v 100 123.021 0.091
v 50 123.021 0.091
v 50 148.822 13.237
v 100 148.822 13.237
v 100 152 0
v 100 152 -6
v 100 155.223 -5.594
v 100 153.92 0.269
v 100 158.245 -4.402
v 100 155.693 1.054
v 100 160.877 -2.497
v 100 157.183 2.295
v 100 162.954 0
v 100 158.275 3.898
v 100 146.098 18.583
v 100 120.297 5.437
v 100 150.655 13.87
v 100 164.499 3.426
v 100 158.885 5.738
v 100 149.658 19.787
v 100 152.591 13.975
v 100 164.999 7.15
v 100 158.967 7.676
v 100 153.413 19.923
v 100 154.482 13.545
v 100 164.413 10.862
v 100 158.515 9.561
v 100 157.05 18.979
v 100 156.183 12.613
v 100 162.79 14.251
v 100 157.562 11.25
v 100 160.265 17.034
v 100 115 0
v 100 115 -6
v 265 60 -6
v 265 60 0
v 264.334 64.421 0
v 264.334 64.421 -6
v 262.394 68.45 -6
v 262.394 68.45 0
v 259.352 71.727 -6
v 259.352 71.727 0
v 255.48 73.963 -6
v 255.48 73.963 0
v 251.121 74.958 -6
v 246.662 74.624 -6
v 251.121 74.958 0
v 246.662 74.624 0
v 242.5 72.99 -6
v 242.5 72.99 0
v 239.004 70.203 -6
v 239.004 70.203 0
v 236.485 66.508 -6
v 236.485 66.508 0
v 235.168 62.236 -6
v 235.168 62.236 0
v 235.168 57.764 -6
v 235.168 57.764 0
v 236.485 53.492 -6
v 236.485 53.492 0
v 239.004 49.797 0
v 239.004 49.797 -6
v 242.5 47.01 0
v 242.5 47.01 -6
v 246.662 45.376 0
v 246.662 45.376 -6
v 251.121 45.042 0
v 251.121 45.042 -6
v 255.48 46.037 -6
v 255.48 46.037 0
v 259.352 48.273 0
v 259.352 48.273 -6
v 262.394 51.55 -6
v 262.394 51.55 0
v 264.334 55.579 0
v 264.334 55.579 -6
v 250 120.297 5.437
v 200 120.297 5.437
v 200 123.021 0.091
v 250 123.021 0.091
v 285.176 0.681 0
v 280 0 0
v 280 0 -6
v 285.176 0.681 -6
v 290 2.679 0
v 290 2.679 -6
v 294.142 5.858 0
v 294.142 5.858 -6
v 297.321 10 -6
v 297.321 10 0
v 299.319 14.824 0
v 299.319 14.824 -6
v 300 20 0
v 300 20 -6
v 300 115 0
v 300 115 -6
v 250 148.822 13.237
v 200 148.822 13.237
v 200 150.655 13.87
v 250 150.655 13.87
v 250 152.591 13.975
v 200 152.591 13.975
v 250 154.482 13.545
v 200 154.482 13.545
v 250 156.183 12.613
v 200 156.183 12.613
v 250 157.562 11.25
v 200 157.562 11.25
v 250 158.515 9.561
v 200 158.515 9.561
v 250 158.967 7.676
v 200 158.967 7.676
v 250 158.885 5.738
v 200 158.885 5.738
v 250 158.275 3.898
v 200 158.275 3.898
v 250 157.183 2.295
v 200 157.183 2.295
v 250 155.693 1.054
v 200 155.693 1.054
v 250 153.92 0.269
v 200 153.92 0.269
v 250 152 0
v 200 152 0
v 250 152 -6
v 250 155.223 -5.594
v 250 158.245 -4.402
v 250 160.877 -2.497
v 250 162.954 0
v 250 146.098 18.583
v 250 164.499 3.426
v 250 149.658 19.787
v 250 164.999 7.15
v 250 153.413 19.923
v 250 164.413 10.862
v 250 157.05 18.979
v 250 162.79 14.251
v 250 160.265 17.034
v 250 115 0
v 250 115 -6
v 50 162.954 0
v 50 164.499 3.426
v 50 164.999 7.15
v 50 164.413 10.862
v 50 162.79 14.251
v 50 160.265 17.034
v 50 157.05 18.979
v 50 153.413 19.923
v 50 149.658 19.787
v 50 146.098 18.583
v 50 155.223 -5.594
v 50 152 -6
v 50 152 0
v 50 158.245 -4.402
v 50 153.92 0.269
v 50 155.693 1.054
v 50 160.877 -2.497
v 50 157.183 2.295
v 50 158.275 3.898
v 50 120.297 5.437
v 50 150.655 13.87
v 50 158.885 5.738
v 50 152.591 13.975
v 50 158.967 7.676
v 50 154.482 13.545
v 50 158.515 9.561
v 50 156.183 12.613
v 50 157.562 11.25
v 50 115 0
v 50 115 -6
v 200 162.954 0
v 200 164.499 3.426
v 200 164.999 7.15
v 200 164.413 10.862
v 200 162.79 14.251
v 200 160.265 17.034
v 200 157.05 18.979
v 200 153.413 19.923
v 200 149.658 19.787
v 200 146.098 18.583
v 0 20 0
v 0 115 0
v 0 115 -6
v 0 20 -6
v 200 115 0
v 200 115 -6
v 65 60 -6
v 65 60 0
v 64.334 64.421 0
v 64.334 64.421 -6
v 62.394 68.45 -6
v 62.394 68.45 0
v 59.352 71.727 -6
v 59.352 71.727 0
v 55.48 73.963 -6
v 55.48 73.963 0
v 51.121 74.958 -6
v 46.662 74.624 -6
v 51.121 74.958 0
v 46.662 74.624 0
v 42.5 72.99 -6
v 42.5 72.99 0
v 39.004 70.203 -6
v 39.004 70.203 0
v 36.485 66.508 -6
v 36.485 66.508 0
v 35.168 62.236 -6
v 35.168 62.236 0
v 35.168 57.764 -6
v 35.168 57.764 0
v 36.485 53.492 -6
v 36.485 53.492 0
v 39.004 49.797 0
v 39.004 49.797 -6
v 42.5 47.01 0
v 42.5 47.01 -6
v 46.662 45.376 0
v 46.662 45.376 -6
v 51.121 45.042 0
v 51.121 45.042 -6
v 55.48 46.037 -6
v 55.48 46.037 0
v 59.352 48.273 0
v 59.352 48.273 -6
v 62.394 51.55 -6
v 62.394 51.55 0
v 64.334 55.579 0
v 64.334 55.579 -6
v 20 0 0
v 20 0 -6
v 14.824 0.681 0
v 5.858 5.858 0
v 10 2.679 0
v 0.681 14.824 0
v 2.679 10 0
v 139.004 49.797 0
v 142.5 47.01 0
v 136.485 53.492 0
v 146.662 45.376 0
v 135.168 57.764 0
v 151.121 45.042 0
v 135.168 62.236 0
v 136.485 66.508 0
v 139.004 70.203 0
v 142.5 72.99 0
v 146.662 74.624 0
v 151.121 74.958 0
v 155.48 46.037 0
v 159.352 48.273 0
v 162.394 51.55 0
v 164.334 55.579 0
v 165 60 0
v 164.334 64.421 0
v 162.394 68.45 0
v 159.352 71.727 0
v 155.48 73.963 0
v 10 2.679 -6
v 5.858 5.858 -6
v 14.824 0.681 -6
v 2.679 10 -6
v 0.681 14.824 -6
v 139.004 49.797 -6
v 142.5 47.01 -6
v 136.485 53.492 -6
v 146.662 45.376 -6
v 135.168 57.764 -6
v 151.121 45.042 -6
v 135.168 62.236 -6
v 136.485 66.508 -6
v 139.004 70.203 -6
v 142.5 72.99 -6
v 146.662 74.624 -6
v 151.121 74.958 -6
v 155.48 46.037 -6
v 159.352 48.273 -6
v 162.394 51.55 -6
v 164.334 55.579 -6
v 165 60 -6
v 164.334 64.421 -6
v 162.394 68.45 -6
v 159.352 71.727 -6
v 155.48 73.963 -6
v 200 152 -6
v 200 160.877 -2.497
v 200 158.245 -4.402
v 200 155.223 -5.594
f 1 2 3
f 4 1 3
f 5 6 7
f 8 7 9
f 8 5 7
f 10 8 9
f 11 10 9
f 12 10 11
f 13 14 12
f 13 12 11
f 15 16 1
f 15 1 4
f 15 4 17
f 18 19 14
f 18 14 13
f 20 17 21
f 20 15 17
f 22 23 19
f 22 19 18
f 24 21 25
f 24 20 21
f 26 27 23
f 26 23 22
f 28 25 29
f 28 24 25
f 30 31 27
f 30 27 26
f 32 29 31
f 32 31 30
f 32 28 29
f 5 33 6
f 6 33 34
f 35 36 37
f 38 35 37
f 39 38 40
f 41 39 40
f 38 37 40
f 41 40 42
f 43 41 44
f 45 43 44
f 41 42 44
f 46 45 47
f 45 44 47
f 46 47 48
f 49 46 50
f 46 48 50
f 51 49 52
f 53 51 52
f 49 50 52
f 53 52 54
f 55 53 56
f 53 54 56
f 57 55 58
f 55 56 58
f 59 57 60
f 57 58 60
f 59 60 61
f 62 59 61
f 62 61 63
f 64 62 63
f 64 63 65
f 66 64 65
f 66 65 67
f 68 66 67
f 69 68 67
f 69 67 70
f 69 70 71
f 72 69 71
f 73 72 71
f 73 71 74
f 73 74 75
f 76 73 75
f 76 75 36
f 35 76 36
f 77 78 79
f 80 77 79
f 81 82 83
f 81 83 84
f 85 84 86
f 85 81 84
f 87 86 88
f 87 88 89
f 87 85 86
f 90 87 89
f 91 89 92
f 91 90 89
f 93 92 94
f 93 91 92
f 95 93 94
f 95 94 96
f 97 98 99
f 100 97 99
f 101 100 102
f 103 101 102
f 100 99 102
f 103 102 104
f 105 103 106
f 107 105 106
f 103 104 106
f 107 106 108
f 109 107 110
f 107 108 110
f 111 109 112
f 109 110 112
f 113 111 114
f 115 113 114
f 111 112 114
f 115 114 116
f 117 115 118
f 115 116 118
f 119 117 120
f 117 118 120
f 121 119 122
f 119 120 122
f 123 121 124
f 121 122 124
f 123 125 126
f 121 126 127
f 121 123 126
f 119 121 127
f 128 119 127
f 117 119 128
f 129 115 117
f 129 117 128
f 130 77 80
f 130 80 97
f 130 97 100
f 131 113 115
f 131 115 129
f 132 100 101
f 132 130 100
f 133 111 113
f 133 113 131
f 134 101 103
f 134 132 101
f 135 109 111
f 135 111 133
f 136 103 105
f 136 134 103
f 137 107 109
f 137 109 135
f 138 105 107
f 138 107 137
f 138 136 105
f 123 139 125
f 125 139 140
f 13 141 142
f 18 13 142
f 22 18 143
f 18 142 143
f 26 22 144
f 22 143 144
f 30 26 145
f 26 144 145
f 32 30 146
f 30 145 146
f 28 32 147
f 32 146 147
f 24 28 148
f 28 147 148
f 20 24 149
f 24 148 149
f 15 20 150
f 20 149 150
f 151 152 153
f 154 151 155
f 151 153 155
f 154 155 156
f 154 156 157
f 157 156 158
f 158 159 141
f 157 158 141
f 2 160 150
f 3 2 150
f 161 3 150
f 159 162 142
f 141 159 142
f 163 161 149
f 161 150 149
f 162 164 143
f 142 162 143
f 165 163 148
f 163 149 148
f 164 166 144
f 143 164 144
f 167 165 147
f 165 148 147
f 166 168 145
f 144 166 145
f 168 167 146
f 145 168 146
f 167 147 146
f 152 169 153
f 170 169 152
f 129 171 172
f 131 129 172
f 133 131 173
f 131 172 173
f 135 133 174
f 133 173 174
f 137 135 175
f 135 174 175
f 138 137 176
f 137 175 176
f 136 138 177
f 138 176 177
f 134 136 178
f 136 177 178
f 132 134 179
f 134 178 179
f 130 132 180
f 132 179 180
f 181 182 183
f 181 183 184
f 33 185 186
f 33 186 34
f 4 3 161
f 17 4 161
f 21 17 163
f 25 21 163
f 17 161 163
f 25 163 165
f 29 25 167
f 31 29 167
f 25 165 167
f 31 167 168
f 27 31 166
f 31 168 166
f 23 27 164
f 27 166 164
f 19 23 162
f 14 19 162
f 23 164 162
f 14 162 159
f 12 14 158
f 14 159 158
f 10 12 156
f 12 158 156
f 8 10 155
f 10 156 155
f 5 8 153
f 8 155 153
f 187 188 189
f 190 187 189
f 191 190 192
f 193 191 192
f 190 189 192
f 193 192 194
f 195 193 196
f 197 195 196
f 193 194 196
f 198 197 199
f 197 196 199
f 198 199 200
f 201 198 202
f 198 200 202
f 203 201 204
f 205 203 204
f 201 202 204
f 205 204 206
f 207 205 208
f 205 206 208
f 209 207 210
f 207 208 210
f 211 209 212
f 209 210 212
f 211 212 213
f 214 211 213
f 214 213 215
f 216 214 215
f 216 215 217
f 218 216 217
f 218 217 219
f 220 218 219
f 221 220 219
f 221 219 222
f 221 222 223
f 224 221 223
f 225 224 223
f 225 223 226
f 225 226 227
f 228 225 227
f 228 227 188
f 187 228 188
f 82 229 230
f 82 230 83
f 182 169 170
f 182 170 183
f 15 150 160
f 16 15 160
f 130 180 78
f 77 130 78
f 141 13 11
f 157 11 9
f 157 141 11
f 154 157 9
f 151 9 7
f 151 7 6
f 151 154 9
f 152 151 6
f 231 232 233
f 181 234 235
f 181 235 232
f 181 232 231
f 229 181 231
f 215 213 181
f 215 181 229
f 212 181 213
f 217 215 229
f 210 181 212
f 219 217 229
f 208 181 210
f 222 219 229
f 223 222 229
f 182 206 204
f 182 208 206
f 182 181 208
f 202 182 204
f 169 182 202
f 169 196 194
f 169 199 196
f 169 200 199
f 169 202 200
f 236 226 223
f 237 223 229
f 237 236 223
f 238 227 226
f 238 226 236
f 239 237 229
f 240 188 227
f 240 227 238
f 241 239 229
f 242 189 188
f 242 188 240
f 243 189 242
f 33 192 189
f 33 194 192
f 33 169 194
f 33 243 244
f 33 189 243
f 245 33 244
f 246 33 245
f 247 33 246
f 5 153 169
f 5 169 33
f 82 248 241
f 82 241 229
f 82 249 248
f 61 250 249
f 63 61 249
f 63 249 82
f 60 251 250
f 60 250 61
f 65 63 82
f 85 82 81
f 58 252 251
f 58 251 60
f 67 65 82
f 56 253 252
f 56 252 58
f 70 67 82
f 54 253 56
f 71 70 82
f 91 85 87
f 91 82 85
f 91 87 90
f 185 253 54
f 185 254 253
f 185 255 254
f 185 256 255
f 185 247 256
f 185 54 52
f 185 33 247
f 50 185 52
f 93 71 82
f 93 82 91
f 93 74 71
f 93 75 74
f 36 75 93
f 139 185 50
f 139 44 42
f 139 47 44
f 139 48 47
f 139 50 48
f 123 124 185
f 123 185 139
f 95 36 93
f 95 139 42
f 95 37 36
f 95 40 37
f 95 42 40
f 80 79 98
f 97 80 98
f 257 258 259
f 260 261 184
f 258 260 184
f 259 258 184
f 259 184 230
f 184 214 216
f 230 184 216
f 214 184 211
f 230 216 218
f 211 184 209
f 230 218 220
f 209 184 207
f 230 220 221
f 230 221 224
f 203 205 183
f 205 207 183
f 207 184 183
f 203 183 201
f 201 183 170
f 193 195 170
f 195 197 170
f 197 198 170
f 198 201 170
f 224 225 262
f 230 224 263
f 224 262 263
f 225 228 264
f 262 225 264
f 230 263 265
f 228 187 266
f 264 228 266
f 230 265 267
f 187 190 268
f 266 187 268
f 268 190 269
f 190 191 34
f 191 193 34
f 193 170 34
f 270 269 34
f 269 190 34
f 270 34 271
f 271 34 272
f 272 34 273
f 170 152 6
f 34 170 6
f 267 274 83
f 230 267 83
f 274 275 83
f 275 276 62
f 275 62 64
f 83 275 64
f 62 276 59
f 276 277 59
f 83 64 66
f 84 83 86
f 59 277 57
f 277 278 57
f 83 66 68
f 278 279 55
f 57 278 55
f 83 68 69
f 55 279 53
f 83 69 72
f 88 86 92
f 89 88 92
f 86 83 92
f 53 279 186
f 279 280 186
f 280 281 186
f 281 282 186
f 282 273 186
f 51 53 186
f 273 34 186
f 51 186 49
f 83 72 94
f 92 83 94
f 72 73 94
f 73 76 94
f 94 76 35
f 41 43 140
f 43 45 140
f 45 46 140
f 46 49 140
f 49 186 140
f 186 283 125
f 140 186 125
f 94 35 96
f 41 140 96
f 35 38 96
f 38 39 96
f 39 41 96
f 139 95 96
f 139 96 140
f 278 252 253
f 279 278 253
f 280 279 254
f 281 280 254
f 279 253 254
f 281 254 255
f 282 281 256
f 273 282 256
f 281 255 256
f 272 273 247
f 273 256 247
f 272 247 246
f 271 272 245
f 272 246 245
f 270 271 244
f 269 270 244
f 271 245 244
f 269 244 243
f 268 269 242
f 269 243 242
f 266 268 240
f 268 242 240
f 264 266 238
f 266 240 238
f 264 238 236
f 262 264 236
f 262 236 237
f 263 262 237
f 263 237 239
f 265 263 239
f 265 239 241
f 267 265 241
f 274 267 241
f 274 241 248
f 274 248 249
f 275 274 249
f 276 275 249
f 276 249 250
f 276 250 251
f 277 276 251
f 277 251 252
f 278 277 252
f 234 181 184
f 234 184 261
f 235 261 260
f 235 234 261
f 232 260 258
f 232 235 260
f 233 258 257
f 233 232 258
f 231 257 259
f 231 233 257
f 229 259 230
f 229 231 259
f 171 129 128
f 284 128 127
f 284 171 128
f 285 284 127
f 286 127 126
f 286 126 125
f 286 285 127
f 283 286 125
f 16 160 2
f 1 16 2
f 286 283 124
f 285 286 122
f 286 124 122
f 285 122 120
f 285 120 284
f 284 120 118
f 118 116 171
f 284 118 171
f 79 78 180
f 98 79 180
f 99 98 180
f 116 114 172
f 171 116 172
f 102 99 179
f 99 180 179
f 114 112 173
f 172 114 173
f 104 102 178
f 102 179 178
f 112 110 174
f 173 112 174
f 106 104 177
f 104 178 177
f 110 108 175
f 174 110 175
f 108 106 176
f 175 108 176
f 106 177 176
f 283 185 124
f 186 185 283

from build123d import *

# Parameters (mm, degrees)
BASE_FLANGE1_DEPTH = 6
HEM1_START         = 50
HEM1_DEPTH         = 200
HEM1_2_DEPTH       = 50
HEM1_START_2       = 200
HEM1_3_DEPTH       = 50
SKETCH11_R         = 15
CUT_EXTRUDE1_DEPTH = 10


# Read off the part's stored shape, not the designer's step: Hem1
# Sheet-metal steps are written as plain solids
with BuildPart() as part:
    # Sketch2 → Base-Flange1 (new body)
    with BuildSketch(Plane.XY):
        with BuildLine():
            Line((20, 0), (280, 0))
            ThreePointArc((280, 0), (294.142135624, 5.857864376), (300, 20))
            Line((300, 20), (300, 115))
            Line((300, 115), (250, 115))
            Line((250, 115), (250, 165))
            Line((250, 165), (200, 165))
            Line((200, 165), (200, 115))
            Line((200, 115), (100, 115))
            Line((100, 115), (100, 165))
            Line((100, 165), (50, 165))
            Line((50, 165), (50, 115))
            Line((50, 115), (0, 115))
            Line((0, 115), (0, 20))
            ThreePointArc((0, 20), (5.857864376, 5.857864376), (20, 0))
        make_face()
    extrude(amount=-BASE_FLANGE1_DEPTH)

    # Hem1 outline → Hem1 (cut)
    with BuildSketch(Plane.YZ.offset(HEM1_START)):
        with BuildLine():
            Line((165, 0), (162.95445115, 0))
            ThreePointArc((162.95445115, 0), (158.244997998, -4.401754251), (152, -6))
            Line((152, -6), (165, -6))
            Line((165, -6), (165, 0))
        make_face()
    extrude(amount=HEM1_DEPTH, mode=Mode.SUBTRACT)

    # Hem1 2 outline → Hem1 2 (add)
    with BuildSketch(Plane.YZ.offset(HEM1_START)):
        with BuildLine():
            Line((120.297159916, 5.436837245), (123.021102914, 0.0907981))
            Line((123.021102914, 0.0907981), (148.822066502, 13.237045669))
            ThreePointArc((148.822066502, 13.237045669), (158.806589443, 8.634117547), (152, 0))
            Line((152, 0), (162.95445115, 0))
            ThreePointArc((162.95445115, 0), (161.628857043, 15.734134876), (146.098123503, 18.583084814))
            Line((146.098123503, 18.583084814), (120.297159916, 5.436837245))
        make_face()
    extrude(amount=HEM1_2_DEPTH)

    # Hem1 3 outline → Hem1 3 (add)
    with BuildSketch(Plane.YZ.offset(HEM1_START_2)):
        with BuildLine():
            Line((120.297159916, 5.436837245), (123.021102914, 0.0907981))
            Line((123.021102914, 0.0907981), (148.822066502, 13.237045669))
            ThreePointArc((148.822066502, 13.237045669), (158.806589443, 8.634117547), (152, 0))
            Line((152, 0), (162.95445115, 0))
            ThreePointArc((162.95445115, 0), (161.628857043, 15.734134876), (146.098123503, 18.583084814))
            Line((146.098123503, 18.583084814), (120.297159916, 5.436837245))
        make_face()
    extrude(amount=HEM1_3_DEPTH)

    # Sketch11 → Cut-Extrude1 (cut)
    with BuildSketch(Plane.XY):
        with Locations((250, 60)):
            Circle(SKETCH11_R)
        with Locations((150, 60)):
            Circle(SKETCH11_R)
        with Locations((50, 60)):
            Circle(SKETCH11_R)
    extrude(amount=-CUT_EXTRUDE1_DEPTH, mode=Mode.SUBTRACT)


solid = part.part
